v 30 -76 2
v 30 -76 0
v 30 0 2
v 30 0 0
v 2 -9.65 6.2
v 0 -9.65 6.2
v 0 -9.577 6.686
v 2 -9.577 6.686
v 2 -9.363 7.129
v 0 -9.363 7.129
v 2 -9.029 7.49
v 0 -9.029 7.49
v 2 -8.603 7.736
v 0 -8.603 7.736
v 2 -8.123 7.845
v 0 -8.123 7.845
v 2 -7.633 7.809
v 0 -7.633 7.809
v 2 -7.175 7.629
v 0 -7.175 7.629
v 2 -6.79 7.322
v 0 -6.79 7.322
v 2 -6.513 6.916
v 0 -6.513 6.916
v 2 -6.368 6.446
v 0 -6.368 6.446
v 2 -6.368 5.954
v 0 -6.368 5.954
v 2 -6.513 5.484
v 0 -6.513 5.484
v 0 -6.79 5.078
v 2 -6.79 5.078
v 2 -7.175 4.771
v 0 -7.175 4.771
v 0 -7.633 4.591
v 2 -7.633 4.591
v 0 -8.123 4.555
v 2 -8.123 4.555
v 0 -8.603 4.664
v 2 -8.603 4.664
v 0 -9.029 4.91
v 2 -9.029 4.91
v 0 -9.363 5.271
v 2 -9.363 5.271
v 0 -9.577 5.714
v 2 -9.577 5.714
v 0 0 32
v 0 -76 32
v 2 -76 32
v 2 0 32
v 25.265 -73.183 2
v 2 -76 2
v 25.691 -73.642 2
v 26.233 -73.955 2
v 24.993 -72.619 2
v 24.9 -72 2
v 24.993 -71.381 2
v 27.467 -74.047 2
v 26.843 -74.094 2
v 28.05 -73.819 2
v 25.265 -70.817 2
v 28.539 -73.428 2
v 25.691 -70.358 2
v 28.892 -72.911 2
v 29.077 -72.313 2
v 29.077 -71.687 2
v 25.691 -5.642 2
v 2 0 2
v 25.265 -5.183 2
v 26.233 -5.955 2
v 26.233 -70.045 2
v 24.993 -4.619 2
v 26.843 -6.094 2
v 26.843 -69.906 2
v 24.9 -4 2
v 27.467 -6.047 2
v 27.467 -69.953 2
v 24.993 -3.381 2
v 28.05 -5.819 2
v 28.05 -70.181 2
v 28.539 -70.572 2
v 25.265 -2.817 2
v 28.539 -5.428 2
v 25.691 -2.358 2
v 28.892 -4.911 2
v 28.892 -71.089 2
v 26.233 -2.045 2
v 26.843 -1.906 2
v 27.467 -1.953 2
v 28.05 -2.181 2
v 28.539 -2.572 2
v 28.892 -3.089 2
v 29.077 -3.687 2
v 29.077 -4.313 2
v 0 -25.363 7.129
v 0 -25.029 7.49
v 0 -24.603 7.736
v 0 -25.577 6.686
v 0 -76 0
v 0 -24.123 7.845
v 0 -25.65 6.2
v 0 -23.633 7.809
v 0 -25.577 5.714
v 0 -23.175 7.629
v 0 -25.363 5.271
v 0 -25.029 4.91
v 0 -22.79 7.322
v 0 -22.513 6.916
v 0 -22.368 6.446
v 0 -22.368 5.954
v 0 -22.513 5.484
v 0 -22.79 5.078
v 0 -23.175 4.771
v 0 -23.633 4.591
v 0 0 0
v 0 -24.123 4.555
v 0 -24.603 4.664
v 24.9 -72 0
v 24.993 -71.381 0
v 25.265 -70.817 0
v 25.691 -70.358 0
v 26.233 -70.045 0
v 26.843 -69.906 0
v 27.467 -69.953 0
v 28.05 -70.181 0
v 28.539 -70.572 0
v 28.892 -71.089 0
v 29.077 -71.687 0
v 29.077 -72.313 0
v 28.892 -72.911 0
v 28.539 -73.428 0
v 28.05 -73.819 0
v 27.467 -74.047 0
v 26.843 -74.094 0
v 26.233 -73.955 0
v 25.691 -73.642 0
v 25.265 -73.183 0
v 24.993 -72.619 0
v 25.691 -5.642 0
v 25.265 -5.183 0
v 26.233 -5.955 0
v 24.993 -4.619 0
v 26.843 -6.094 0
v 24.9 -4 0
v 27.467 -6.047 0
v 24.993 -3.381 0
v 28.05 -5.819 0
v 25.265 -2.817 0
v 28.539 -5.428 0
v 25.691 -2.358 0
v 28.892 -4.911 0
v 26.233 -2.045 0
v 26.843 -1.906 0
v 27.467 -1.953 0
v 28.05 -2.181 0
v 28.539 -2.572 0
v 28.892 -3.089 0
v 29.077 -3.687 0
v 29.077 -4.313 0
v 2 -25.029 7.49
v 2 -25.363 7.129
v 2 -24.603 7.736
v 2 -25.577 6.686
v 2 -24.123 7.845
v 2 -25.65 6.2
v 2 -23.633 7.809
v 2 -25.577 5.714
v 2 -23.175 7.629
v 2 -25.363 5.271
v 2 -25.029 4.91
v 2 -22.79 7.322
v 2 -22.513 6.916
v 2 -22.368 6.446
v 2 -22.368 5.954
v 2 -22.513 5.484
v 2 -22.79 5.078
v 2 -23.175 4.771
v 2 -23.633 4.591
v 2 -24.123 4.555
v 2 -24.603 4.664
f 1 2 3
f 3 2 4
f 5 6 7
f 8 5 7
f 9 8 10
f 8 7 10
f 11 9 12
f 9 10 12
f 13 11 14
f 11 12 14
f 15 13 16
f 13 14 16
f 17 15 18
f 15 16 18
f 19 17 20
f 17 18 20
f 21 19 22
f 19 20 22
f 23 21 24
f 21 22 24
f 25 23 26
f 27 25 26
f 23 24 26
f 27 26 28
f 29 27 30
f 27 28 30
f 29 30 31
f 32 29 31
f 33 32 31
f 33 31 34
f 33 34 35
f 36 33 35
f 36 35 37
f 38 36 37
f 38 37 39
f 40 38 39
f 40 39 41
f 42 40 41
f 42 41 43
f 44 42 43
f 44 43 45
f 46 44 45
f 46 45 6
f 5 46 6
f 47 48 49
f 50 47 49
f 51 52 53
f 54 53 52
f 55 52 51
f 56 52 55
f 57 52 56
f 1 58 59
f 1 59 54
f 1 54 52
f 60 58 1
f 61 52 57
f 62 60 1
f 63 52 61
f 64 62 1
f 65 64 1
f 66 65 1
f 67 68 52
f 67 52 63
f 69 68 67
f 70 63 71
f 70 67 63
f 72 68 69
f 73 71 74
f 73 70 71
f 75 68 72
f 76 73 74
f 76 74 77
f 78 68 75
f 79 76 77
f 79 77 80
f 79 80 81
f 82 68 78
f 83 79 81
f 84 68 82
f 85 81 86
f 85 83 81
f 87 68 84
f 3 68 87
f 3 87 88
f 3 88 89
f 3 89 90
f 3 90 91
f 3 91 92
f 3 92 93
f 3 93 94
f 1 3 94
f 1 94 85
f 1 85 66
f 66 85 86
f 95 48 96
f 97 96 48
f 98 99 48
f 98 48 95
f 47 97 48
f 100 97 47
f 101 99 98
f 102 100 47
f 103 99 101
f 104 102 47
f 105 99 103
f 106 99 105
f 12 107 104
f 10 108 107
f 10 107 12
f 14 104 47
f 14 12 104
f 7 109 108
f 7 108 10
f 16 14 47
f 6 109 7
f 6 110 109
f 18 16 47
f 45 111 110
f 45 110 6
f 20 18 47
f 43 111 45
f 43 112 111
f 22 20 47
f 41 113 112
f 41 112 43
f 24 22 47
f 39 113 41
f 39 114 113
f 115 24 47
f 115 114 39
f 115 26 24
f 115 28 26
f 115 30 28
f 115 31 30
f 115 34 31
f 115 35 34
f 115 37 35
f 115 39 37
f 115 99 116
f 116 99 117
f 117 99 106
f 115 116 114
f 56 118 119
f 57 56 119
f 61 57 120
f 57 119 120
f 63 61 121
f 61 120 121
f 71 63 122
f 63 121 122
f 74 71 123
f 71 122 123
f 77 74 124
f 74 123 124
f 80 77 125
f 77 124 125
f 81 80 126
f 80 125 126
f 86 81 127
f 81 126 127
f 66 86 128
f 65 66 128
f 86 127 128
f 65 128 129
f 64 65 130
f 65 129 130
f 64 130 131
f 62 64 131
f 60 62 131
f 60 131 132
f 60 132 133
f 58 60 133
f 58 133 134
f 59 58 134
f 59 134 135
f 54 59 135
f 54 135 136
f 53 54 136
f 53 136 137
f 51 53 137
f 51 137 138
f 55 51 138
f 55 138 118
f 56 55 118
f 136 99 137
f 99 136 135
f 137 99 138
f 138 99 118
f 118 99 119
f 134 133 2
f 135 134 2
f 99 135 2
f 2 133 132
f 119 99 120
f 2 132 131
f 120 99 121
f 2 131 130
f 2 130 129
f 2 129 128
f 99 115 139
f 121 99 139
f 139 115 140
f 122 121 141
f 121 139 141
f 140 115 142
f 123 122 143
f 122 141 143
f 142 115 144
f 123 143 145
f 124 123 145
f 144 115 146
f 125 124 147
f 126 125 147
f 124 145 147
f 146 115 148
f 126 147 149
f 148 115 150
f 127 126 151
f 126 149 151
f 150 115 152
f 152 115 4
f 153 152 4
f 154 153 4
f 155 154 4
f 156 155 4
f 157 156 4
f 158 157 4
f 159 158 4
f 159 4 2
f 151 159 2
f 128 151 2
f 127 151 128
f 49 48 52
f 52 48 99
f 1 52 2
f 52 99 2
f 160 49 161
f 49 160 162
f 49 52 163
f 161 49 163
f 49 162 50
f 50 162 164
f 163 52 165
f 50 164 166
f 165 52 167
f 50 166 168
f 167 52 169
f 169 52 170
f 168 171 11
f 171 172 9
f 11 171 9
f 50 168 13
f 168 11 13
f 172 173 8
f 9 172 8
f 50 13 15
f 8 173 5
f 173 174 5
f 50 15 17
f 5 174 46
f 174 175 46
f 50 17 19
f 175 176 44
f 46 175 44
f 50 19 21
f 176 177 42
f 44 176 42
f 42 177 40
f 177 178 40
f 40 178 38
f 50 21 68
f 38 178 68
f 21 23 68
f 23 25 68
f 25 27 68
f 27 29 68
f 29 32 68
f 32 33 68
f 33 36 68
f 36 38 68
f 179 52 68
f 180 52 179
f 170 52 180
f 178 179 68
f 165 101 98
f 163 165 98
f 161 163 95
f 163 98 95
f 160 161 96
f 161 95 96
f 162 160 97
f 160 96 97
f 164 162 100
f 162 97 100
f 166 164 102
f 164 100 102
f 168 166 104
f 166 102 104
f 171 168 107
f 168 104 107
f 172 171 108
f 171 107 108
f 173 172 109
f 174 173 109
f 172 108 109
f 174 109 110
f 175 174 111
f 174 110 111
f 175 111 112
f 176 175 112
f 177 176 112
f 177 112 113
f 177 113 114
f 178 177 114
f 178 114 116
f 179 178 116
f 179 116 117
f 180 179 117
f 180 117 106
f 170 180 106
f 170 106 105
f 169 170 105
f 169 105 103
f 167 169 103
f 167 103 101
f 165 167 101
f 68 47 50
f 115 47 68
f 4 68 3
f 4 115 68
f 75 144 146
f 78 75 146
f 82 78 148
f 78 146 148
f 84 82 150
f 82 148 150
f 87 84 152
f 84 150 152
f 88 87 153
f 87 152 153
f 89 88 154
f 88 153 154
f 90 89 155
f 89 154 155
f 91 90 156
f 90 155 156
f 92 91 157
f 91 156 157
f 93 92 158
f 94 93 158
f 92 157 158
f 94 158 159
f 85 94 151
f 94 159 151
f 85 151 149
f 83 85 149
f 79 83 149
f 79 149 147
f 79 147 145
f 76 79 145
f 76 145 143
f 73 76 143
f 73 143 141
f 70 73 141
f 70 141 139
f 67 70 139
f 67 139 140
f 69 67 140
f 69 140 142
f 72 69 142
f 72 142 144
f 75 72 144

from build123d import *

# Parameters (mm, degrees)
SKETCH_1_W          = 30
SKETCH_1_H          = 76
EXTRUDE_1_DEPTH     = 2
SKETCH_2_W          = 2
SKETCH_2_H          = 76
EXTRUDE_2_DEPTH     = 30
SKETCH_3_R          = 2.1
CUT_EXTRUDE_3_DEPTH = 88.749643874
SKETCH_4_R          = 1.65
CUT_EXTRUDE_4_DEPTH = 88.749643874


with BuildPart() as part:
    # ｽｹｯﾁ1 → 押し出し1 (new body)
    with BuildSketch(Plane.XY):
        with Locations((15, -38)):
            Rectangle(SKETCH_1_W, SKETCH_1_H)
    extrude(amount=EXTRUDE_1_DEPTH)

    # ｽｹｯﾁ2 → 押し出し2 (add)
    with BuildSketch(Plane.XY.offset(2)):
        with Locations((1, -38)):
            Rectangle(SKETCH_2_W, SKETCH_2_H)
    extrude(amount=EXTRUDE_2_DEPTH)

    # ｽｹｯﾁ3 → 押し出し3 (cut, through all)
    with BuildSketch(Plane(origin=(0, 0, 0), x_dir=(-1, 0, 0), z_dir=(0, 0, -1))):
        with Locations((-27, -4)):
            Circle(SKETCH_3_R)
        with Locations((-27, -72)):
            Circle(SKETCH_3_R)
    extrude(amount=-CUT_EXTRUDE_3_DEPTH, mode=Mode.SUBTRACT)

    # ｽｹｯﾁ4 → 押し出し4 (cut, through all)
    with BuildSketch(Plane.ZY):
        with Locations(Location((6.2, -8, 0), (0, 0, 270))):
            Circle(SKETCH_4_R)
        with Locations(Location((6.2, -24, 0), (0, 0, 270))):
            Circle(SKETCH_4_R)
    extrude(amount=-CUT_EXTRUDE_4_DEPTH, mode=Mode.SUBTRACT)


solid = part.part
